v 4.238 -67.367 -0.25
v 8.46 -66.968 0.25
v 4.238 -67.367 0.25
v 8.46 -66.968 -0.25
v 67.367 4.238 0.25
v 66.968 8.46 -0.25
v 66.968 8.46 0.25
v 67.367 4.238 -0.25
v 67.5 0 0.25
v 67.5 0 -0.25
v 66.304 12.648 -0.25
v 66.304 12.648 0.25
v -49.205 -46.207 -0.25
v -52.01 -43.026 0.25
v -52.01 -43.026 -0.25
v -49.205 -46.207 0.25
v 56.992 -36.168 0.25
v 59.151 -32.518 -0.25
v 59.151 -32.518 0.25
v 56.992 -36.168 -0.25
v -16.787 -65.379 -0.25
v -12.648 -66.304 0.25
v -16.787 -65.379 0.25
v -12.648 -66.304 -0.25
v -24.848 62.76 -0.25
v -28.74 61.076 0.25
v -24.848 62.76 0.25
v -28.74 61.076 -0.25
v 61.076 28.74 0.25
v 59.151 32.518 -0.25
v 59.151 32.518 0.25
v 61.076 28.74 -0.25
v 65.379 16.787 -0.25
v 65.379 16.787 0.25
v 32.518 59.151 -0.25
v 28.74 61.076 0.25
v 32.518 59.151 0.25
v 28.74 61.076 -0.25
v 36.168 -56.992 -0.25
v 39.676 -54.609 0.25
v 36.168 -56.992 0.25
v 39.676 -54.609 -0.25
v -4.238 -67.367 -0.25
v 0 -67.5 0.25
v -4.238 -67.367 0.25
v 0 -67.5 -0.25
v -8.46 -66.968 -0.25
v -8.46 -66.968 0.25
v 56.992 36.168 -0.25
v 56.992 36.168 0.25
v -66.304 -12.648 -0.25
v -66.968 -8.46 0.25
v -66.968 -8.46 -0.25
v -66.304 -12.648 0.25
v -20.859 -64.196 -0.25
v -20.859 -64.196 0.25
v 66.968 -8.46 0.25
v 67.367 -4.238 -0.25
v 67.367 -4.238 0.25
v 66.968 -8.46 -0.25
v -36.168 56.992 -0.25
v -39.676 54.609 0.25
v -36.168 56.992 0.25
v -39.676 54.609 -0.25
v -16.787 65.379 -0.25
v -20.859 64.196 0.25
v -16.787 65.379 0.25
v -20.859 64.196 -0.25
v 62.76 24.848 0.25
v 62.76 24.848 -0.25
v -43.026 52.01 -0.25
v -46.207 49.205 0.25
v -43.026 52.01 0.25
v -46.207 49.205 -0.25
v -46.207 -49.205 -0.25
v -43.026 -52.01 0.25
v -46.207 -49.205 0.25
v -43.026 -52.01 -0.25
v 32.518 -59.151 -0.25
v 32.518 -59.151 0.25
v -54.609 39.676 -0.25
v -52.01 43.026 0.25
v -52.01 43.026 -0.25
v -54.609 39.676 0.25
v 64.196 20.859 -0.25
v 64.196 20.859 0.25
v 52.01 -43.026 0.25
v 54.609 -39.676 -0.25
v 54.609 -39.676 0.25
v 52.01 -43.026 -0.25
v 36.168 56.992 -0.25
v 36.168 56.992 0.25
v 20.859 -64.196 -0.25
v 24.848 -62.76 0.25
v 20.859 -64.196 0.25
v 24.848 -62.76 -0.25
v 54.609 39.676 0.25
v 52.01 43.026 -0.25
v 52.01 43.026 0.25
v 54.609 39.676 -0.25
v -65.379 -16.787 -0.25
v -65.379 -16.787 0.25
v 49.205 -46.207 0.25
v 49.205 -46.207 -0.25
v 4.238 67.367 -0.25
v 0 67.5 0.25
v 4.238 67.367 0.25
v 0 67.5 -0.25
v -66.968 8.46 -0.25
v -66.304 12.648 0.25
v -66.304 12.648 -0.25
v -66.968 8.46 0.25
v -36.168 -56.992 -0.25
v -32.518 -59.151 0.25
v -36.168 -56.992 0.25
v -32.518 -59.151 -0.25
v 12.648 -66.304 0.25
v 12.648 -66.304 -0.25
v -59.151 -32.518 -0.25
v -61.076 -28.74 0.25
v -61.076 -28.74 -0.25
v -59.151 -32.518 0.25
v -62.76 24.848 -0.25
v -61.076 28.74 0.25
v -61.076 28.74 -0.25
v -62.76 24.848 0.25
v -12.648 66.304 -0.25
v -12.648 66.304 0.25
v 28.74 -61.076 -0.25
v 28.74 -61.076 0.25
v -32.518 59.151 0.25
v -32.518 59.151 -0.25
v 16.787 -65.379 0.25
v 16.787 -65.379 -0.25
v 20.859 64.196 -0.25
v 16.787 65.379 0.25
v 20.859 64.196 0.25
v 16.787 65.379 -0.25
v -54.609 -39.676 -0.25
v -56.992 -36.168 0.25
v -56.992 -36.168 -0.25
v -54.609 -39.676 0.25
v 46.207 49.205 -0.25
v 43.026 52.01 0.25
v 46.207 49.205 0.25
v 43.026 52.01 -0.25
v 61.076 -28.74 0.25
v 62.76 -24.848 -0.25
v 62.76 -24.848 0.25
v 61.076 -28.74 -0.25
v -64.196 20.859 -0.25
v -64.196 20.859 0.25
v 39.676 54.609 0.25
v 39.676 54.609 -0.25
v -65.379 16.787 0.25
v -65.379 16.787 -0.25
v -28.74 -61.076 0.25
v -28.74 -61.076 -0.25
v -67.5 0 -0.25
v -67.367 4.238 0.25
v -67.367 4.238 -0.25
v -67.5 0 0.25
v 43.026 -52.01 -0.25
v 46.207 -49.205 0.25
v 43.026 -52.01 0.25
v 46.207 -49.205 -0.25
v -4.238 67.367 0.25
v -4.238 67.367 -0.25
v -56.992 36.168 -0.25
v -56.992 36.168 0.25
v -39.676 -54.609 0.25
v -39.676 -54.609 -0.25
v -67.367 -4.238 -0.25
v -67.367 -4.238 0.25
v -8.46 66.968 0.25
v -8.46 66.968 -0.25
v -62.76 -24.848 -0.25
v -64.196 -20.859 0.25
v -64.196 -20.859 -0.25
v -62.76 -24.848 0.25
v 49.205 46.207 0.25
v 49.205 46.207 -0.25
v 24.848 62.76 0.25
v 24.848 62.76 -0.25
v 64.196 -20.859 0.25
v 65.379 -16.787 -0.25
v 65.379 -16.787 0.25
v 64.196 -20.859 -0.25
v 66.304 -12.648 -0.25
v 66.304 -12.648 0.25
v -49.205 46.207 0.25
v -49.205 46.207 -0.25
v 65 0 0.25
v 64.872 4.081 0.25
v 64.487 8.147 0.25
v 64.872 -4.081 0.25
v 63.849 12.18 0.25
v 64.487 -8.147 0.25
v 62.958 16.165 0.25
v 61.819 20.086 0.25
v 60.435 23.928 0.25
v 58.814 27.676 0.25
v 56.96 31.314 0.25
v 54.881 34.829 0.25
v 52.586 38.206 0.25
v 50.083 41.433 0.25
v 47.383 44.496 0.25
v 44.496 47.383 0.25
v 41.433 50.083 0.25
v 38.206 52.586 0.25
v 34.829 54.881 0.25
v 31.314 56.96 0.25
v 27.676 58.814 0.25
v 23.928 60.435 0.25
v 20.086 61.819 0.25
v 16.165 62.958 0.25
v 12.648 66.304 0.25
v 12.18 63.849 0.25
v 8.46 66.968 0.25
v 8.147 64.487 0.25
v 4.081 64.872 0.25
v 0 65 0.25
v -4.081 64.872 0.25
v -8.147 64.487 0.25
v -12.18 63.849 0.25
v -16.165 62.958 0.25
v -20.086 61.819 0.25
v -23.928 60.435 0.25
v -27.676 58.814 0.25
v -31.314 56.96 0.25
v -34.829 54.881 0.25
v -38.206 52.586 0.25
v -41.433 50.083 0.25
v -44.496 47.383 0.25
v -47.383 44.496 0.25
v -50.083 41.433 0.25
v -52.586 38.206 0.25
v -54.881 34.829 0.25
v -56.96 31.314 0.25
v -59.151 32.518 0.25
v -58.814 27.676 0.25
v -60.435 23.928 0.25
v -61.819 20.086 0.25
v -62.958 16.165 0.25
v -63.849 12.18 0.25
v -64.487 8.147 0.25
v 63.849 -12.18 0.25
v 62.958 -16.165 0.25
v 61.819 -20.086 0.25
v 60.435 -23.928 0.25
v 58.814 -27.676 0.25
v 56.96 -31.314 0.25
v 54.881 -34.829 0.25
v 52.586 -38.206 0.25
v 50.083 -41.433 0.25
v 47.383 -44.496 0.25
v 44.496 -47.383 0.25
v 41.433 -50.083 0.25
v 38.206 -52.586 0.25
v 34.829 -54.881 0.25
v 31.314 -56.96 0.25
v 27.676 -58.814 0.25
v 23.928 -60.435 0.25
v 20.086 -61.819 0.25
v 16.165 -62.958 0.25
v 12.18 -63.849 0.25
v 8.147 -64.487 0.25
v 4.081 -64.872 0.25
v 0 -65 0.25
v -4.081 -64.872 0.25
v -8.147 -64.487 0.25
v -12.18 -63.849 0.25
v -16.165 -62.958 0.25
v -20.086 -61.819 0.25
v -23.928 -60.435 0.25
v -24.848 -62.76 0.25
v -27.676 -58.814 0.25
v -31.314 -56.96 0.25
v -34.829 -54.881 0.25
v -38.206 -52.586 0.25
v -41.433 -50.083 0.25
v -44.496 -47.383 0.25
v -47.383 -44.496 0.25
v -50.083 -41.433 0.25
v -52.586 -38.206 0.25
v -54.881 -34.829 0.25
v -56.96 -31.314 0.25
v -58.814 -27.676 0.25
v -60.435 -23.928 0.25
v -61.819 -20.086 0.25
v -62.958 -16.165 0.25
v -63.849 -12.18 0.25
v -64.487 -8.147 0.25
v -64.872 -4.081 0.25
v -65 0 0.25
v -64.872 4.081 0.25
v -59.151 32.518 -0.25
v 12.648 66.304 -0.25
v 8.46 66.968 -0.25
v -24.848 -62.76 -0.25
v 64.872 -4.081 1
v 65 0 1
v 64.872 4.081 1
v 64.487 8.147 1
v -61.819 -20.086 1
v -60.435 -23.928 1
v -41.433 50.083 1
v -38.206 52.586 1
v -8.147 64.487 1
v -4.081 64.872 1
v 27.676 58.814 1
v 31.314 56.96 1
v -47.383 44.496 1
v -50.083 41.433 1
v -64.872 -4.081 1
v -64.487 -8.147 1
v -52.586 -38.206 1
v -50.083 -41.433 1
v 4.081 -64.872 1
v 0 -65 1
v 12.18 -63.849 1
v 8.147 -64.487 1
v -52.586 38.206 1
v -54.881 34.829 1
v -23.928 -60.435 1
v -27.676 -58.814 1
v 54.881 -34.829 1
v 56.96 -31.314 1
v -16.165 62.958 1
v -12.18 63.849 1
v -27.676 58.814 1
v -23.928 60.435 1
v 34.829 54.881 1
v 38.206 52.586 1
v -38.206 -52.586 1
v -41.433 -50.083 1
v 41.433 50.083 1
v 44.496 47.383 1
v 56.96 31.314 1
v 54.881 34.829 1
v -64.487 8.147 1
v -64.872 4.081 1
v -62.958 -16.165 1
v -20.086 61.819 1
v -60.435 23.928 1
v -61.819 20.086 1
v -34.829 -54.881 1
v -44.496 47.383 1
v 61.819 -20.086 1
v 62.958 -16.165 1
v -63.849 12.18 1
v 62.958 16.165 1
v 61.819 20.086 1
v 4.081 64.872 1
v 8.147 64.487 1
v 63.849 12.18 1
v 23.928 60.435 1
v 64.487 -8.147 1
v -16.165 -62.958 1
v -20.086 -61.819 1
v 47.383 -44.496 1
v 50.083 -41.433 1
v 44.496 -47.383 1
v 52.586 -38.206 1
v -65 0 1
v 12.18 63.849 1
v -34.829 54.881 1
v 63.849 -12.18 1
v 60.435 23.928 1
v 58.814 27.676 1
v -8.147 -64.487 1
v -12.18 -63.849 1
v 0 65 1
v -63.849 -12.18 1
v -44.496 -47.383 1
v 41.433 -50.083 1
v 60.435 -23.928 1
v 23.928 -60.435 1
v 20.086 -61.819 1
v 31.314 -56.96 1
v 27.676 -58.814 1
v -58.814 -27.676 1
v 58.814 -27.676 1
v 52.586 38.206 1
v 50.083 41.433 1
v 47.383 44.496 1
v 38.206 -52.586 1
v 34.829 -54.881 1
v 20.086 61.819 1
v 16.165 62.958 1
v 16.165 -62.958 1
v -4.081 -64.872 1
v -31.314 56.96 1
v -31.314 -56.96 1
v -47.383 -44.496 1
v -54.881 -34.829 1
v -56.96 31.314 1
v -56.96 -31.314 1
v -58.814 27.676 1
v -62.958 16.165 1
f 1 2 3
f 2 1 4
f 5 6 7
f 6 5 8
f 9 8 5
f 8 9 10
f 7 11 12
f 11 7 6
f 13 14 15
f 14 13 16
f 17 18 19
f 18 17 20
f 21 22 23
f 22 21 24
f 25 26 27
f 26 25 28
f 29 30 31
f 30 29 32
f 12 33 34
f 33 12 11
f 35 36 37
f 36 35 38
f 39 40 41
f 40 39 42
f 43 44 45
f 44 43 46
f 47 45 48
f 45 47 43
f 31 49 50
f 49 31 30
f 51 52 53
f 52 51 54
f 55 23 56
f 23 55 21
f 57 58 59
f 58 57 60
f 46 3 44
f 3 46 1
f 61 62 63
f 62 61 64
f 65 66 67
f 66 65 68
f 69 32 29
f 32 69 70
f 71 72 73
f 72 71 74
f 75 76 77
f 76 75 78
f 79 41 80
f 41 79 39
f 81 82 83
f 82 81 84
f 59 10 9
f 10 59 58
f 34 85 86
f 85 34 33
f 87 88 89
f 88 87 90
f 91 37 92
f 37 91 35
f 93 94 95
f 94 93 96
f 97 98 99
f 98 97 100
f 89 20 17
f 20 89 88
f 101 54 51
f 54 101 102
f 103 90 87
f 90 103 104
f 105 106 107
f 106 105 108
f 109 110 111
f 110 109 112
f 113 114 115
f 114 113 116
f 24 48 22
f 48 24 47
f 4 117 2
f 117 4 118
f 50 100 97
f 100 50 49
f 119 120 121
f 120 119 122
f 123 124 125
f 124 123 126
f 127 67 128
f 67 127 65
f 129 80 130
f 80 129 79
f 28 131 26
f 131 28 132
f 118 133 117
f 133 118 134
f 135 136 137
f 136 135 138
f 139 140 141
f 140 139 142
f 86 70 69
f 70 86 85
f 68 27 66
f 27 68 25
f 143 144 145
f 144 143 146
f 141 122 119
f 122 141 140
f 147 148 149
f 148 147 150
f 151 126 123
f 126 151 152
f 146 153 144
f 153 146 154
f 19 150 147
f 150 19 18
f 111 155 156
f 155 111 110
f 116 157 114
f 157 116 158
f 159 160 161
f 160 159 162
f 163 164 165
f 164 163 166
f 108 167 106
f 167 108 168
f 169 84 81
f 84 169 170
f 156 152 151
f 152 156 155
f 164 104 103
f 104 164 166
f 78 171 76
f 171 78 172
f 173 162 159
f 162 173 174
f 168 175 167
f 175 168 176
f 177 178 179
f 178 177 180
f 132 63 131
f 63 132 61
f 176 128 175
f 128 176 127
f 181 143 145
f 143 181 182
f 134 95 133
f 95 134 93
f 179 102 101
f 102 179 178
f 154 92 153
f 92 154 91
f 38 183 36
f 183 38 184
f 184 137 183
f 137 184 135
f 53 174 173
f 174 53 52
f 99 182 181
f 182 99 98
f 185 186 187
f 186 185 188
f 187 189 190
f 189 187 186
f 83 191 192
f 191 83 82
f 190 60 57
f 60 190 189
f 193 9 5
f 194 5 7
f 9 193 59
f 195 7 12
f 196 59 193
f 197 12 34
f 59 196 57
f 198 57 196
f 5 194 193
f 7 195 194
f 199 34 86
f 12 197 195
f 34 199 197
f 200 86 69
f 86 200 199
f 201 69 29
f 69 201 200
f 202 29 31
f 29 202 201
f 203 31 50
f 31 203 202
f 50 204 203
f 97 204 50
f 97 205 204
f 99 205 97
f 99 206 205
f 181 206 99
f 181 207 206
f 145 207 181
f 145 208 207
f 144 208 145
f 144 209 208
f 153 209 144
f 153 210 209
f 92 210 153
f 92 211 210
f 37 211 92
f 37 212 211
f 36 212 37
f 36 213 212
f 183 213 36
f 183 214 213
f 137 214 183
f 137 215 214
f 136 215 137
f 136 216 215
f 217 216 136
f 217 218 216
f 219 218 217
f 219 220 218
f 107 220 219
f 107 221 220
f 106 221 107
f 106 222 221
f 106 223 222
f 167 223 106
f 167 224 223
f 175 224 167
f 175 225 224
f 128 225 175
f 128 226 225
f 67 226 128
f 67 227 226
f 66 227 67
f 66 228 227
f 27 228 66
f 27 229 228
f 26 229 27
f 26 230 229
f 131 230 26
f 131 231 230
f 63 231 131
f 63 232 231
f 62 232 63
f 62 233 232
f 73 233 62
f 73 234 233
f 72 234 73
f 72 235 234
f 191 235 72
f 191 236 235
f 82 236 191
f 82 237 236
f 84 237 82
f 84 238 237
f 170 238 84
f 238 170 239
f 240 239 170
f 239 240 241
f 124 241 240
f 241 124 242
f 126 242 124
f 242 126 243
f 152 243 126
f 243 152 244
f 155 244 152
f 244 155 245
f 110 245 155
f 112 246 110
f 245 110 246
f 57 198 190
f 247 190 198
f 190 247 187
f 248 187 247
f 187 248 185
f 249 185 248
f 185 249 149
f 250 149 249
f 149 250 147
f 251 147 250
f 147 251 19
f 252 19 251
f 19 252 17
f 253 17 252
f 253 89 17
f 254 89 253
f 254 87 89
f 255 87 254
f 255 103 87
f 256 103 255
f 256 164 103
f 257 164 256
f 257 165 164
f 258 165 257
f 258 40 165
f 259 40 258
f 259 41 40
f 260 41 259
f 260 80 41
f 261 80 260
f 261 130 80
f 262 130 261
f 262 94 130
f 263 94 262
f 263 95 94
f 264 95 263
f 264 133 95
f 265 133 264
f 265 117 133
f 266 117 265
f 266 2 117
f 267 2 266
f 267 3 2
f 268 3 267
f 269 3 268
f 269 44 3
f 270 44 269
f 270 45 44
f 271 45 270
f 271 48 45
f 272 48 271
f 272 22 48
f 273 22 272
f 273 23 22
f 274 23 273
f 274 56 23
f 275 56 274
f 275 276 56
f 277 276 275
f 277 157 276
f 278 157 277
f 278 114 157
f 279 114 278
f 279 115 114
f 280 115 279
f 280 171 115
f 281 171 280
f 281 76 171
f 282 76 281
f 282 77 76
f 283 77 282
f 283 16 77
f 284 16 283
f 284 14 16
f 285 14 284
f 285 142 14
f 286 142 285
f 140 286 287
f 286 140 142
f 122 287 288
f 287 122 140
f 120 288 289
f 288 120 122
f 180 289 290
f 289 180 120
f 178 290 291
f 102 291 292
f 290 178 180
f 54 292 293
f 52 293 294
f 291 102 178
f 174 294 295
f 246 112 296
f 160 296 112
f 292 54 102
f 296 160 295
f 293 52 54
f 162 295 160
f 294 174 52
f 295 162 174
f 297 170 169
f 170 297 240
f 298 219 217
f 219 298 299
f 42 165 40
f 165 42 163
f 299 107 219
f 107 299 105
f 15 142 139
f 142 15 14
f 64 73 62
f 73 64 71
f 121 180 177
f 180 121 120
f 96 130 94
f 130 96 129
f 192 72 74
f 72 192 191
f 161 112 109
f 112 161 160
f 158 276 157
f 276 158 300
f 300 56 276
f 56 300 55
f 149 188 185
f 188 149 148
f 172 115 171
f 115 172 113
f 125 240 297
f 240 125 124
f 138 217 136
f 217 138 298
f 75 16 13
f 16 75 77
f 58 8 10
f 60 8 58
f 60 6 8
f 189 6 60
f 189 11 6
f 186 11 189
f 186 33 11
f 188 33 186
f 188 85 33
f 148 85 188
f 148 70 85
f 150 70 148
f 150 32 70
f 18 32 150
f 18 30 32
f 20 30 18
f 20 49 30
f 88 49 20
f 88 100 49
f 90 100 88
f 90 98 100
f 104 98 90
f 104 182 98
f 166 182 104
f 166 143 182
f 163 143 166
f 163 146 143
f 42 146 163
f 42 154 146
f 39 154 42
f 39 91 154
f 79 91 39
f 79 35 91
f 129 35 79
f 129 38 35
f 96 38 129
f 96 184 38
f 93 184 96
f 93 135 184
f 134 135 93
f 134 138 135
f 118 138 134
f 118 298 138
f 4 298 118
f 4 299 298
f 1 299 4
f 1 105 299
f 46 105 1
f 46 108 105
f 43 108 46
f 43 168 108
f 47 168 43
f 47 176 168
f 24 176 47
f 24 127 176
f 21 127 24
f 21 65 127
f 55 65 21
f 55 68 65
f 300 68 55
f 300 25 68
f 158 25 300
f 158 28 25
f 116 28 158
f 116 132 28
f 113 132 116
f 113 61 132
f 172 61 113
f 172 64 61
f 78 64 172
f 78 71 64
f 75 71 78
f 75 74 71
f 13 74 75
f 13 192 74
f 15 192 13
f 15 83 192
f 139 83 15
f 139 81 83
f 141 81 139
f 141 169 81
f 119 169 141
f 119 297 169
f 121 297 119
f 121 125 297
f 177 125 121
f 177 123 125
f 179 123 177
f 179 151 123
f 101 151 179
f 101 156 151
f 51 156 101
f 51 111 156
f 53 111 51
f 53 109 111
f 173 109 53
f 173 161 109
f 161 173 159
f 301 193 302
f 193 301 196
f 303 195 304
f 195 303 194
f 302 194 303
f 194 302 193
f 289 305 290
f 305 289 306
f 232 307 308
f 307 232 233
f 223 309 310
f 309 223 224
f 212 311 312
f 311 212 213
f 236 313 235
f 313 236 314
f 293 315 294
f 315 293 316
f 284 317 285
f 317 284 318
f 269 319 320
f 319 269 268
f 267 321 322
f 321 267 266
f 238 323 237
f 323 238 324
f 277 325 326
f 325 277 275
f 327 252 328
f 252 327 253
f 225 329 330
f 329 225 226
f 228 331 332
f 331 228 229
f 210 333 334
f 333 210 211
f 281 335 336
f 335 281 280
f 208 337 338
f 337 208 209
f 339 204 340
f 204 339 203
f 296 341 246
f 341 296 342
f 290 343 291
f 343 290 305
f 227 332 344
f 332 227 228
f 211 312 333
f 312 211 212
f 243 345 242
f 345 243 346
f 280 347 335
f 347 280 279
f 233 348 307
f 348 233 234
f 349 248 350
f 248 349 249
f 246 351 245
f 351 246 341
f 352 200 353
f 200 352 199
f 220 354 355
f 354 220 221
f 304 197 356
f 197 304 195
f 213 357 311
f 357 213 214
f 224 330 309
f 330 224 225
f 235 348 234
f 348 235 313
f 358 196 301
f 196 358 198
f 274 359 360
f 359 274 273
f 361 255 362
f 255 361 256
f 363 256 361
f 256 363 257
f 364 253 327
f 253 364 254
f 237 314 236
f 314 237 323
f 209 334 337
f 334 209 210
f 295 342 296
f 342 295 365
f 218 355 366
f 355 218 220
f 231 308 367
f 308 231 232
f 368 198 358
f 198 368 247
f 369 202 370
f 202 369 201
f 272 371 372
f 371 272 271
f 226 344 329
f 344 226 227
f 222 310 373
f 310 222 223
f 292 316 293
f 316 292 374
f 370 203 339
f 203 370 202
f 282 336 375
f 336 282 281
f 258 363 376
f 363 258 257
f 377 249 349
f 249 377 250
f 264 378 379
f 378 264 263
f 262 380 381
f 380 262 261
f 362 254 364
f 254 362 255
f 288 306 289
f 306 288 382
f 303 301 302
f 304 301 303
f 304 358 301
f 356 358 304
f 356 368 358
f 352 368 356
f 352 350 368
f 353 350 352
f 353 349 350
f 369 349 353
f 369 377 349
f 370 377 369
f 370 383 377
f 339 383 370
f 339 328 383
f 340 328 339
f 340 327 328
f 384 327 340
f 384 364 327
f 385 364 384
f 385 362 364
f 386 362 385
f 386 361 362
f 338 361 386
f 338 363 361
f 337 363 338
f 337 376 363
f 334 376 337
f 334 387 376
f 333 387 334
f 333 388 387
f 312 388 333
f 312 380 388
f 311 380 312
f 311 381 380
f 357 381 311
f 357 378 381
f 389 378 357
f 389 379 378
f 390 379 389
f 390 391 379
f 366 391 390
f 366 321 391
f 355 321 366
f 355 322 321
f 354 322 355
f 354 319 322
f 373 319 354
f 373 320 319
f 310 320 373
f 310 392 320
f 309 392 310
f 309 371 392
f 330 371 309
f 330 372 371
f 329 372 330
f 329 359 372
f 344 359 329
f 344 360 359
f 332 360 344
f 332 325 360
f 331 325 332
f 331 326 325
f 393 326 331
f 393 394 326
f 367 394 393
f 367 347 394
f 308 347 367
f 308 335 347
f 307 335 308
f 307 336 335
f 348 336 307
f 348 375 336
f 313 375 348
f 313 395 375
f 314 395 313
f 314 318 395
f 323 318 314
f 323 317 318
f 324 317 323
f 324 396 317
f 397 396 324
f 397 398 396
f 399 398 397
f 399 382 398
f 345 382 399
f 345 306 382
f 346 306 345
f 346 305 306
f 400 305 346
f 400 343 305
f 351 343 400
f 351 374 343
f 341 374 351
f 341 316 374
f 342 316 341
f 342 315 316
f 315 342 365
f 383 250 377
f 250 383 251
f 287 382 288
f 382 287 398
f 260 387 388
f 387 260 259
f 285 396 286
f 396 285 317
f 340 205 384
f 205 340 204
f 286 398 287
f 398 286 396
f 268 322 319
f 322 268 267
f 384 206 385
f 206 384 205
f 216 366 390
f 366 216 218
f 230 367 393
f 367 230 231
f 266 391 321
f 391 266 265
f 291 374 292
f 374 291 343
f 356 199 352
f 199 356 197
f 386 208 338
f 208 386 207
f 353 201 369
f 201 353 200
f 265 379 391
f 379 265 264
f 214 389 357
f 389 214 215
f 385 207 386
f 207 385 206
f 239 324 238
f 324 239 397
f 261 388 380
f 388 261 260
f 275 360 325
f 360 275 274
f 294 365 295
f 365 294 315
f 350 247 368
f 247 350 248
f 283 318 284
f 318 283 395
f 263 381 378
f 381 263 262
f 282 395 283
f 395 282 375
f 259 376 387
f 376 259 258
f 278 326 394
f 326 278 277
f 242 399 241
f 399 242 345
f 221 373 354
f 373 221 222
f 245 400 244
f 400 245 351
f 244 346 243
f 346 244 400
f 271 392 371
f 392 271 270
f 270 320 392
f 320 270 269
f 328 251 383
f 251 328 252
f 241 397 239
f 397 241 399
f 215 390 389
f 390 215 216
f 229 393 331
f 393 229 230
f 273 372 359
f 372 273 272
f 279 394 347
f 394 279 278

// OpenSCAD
//Parametric Light Lens for a recessed overhead light

// Large diameter
d=135; 
// lip width
l=5;
//height
h=1;

$fn=100;

union(){
cylinder(r=d/2, h=h/2, center=true);
translate([0,0,h/2])cylinder(r=(d-l)/2, h=h, center=true);
}

